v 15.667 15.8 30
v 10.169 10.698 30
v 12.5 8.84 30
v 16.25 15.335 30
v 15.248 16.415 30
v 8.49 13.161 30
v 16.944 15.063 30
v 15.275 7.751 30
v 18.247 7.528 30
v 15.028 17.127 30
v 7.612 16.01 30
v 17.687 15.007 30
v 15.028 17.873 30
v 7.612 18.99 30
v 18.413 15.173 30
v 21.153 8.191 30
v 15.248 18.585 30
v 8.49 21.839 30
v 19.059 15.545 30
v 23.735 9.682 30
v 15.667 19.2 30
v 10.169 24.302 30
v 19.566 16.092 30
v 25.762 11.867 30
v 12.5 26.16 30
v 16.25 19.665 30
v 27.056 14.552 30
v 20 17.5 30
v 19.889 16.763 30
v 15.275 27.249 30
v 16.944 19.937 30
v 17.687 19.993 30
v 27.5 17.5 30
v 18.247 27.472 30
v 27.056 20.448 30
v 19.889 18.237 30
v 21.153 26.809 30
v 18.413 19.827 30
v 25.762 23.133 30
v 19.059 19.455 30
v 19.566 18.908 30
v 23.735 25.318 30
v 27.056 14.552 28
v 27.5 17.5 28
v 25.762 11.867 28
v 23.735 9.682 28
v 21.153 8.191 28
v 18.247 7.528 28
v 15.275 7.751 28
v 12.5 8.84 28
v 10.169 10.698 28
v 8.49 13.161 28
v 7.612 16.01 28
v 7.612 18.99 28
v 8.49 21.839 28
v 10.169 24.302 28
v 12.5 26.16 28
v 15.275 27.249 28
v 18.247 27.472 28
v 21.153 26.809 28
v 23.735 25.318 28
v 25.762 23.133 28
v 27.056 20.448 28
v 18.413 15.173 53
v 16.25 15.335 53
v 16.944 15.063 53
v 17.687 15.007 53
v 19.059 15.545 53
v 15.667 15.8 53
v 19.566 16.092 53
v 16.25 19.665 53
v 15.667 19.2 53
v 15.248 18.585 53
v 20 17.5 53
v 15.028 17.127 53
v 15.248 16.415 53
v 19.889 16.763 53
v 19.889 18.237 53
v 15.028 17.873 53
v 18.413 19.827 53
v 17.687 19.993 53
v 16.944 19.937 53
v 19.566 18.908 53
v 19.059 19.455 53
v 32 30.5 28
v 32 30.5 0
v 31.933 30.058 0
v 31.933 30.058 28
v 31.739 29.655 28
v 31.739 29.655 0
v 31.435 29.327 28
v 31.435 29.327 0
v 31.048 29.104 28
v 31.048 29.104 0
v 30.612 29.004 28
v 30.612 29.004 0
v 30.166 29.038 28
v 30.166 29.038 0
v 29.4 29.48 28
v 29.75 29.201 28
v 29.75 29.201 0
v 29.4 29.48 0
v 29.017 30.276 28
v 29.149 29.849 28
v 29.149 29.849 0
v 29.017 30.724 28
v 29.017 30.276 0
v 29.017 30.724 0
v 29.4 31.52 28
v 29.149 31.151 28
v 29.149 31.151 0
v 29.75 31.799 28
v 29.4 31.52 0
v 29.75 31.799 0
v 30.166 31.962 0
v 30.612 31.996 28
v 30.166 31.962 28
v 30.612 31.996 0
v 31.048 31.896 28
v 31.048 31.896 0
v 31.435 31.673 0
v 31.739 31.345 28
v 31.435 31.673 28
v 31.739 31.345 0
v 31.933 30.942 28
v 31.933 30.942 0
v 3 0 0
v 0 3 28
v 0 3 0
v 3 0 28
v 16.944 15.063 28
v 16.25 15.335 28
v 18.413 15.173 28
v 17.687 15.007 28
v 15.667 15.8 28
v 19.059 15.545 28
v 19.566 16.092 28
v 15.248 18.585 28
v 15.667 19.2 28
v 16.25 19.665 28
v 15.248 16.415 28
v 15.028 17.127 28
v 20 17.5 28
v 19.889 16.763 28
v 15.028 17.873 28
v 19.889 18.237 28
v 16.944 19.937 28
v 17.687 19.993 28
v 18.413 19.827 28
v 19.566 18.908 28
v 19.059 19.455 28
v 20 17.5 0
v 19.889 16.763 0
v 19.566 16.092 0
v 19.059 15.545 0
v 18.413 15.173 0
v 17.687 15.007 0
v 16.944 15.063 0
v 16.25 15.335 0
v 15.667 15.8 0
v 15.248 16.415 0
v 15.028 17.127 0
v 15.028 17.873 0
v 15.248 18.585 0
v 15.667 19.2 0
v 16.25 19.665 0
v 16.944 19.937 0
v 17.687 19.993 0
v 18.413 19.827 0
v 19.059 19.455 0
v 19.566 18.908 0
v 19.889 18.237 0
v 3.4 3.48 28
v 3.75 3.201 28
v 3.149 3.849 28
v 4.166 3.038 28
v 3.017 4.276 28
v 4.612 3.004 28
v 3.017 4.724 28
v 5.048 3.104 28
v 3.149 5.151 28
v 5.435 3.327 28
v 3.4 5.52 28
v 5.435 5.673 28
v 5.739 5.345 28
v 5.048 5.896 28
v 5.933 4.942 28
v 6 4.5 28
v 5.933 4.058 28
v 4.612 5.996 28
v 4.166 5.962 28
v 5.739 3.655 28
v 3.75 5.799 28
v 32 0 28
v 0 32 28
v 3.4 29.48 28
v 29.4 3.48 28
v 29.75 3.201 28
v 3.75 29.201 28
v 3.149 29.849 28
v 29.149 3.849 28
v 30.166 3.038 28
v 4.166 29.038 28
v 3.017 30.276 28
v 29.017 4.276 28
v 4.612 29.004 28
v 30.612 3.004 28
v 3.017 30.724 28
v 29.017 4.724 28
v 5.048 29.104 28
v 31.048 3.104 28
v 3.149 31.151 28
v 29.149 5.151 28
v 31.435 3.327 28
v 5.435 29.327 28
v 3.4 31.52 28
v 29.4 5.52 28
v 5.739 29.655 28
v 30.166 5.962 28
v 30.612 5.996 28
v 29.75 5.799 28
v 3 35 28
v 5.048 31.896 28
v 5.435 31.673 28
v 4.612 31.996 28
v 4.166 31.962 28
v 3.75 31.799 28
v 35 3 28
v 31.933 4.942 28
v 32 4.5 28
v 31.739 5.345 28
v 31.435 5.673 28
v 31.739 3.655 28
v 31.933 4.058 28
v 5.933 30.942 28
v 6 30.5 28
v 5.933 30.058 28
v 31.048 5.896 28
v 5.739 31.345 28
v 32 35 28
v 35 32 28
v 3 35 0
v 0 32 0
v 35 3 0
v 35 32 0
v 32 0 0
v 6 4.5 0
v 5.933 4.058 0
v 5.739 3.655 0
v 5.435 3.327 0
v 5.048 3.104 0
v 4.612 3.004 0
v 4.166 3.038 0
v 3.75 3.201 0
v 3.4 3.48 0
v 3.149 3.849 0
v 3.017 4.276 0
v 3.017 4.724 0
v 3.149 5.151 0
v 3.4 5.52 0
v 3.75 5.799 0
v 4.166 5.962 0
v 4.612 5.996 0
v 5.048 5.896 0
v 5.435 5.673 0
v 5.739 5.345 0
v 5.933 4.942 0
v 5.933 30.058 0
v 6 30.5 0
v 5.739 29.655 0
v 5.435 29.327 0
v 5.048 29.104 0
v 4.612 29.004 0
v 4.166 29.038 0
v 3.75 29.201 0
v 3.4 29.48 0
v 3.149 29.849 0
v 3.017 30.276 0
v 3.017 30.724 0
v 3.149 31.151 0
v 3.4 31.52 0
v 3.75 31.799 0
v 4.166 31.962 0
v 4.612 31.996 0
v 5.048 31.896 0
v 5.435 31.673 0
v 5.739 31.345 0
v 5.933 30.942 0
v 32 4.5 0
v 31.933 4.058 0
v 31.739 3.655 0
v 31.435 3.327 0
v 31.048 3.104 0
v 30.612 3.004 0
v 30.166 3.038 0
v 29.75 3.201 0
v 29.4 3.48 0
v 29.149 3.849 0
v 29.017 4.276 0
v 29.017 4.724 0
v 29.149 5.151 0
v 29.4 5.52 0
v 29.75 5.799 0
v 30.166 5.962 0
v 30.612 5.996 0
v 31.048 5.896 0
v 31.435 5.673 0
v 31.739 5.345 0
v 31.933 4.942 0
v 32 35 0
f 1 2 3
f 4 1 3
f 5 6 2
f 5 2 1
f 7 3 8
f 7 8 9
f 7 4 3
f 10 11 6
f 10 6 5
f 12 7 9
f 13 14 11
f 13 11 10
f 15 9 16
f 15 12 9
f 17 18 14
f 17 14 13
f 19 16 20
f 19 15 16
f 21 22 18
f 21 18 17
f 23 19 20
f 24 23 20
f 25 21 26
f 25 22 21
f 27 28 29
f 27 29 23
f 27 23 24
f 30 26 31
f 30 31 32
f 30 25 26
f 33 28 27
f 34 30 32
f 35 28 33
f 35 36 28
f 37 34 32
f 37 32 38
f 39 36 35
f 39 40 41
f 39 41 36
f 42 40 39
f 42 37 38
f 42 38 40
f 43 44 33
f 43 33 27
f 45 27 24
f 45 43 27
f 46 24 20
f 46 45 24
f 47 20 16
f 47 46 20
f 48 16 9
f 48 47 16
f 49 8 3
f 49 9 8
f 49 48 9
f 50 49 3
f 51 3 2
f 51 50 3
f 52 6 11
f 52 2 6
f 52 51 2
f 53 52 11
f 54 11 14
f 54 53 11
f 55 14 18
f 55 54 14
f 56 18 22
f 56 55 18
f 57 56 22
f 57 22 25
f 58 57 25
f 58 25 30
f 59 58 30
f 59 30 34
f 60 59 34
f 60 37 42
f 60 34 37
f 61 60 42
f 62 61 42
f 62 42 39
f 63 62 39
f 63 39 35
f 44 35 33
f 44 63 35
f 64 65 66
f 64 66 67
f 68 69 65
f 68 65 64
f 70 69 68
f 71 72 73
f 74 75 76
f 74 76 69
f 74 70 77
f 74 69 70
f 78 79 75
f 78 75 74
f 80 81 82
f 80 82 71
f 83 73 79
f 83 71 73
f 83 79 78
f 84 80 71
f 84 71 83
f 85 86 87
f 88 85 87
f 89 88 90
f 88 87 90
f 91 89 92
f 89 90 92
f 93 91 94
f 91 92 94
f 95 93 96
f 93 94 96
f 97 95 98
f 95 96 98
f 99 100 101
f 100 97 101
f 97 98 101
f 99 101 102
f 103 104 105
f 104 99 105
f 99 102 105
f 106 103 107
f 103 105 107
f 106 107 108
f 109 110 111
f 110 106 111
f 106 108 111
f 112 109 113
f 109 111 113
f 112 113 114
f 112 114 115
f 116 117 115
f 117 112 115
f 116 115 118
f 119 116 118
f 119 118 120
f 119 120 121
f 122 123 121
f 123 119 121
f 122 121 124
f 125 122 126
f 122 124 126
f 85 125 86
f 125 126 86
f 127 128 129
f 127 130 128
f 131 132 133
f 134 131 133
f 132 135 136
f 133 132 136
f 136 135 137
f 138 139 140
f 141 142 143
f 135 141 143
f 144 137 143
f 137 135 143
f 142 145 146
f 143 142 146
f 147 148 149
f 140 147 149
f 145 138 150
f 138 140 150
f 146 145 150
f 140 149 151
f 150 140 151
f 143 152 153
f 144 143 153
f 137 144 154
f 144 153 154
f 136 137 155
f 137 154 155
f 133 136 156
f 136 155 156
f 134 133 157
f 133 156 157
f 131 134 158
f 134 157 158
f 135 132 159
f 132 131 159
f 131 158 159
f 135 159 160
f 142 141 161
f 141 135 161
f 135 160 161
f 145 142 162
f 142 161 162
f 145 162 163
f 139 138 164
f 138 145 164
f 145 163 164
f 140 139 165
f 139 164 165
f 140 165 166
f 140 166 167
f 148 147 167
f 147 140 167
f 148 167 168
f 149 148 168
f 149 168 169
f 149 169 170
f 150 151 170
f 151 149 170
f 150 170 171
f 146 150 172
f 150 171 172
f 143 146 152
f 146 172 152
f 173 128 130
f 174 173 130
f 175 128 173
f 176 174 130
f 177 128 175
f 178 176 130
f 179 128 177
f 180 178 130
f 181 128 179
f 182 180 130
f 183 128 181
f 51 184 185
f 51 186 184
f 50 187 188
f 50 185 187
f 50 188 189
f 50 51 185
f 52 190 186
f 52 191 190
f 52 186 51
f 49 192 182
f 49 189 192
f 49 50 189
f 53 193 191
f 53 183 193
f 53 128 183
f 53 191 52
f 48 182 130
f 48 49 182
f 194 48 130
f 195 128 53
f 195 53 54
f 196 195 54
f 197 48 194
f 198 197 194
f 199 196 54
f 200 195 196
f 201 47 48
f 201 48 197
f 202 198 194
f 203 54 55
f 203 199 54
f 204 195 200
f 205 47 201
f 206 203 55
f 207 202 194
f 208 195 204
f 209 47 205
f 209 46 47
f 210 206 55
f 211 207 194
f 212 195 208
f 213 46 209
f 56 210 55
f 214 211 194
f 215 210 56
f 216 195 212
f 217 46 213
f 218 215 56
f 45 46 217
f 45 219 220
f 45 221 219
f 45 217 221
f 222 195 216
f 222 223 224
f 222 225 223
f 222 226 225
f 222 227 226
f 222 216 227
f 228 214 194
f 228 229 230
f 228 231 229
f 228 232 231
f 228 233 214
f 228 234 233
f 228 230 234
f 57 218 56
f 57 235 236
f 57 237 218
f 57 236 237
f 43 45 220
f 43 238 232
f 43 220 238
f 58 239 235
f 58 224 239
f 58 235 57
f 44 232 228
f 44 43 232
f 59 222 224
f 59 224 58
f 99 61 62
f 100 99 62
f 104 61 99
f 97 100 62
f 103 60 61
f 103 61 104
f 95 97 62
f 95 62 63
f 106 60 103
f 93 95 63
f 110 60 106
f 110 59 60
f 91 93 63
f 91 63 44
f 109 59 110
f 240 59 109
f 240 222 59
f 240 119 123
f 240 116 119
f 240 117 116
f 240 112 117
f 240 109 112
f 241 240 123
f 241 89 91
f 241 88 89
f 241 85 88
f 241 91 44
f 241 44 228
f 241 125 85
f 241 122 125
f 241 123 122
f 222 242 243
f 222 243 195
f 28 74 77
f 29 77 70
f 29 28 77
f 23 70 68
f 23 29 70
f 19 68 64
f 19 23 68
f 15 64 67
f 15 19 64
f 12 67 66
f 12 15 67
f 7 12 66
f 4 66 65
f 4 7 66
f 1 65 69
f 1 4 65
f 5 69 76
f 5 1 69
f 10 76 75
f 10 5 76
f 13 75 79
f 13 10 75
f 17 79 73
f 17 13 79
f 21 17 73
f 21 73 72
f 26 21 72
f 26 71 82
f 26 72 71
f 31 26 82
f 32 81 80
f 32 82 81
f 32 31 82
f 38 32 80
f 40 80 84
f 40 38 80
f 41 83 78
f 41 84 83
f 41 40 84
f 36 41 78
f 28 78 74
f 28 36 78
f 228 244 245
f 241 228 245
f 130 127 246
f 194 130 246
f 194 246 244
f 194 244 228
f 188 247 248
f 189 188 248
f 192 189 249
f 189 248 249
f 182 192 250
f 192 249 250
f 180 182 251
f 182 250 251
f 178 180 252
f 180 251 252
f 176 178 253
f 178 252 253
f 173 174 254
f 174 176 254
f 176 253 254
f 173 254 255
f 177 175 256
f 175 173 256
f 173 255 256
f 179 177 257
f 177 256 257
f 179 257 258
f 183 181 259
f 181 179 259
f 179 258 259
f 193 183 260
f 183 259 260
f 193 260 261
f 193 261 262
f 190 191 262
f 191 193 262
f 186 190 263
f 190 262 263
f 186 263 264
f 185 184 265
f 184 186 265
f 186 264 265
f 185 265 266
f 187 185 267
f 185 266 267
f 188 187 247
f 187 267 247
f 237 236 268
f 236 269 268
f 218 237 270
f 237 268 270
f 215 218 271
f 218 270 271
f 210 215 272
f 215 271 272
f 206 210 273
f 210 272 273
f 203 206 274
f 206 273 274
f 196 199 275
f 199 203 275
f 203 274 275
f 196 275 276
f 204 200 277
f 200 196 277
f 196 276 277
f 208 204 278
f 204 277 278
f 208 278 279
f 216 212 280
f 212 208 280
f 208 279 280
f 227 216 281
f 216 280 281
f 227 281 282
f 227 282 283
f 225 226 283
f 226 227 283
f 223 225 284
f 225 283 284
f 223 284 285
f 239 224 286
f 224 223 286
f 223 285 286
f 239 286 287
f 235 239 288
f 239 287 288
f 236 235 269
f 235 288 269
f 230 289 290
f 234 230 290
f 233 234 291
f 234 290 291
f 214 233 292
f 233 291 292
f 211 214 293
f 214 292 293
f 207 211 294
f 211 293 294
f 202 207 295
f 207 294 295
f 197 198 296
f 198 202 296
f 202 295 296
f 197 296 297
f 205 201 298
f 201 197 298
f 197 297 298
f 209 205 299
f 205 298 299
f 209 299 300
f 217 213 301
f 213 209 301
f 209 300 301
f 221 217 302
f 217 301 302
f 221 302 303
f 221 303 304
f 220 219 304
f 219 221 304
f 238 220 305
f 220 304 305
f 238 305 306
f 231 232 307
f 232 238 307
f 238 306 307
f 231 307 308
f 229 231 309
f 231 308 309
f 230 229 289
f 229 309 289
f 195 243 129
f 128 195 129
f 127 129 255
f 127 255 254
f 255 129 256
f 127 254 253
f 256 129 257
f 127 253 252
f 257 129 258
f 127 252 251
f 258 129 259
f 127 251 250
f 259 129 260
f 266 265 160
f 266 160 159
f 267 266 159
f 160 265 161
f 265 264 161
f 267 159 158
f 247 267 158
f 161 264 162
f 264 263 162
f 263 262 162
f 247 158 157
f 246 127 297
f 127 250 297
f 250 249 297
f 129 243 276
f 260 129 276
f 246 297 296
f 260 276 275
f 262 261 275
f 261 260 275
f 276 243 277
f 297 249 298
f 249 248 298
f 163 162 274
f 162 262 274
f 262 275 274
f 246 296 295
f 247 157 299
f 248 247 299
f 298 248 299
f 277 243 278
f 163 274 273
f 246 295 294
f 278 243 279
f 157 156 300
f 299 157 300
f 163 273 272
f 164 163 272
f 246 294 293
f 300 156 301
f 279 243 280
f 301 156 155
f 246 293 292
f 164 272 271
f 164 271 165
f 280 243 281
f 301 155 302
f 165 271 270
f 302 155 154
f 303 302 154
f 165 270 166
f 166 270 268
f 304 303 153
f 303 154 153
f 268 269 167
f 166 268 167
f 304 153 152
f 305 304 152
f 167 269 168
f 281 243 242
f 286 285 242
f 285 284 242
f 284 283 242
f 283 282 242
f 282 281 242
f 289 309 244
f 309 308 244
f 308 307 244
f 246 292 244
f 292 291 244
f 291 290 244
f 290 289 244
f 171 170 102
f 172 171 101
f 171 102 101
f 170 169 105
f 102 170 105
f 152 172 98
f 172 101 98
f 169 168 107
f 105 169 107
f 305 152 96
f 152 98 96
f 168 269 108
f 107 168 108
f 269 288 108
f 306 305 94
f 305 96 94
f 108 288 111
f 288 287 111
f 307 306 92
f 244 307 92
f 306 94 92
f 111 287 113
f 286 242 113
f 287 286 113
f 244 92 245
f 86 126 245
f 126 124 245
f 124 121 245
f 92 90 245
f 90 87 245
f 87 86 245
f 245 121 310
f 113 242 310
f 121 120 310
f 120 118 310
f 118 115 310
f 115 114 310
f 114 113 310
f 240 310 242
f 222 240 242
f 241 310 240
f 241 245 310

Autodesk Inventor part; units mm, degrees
ref_plane "YZ Plane" through (0, 0, 0) normal (1, 0, 0) x (0, 1, 0)
ref_plane "XZ Plane" through (0, 0, 0) normal (0, 1, 0) x (-1, 0, 0)
ref_plane "XY Plane" through (0, 0, 0) normal (0, 0, 1) x (1, 0, 0)
sketch "Sketch1" plane through (0, 0, 0) normal (0, 0, 1) x (1, 0, 0)
  line L0 (0, 0) -> (35, 0)
  line L1 (35, 0) -> (35, 35)
  line L2 (35, 35) -> (0, 35)
  line L3 (0, 35) -> (0, 0)
  line L4 (4.5, 30.5) -> (30.5, 30.5) construction
  line L5 (30.5, 30.5) -> (30.5, 4.5) construction
  line L6 (30.5, 4.5) -> (4.5, 4.5) construction
  line L7 (4.5, 4.5) -> (4.5, 30.5) construction
  circle A0 centre (4.5, 30.5) radius 1.5
  circle A1 centre (30.5, 30.5) radius 1.5
  circle A2 centre (30.5, 4.5) radius 1.5
  circle A3 centre (4.5, 4.5) radius 1.5
  circle A4 centre (17.5, 17.5) radius 2.5
  point P0 (17.5, 35)
  point P1 (35, 17.5)
  dimension "d0" = 35
  dimension "d1" = 35
  dimension "d2" = 26
  dimension "d3" = 3
  dimension "d4" = 3
  dimension "d5" = 3
  dimension "d6" = 3
  dimension "d9" = 5
extrude "Extrusion1" add sketch "Sketch1" along normal blind 28
chamfer "Chamfer1" distance 3 angle 45 4 edges at (35, 35, 14) (35, 0, 14) (0, 0, 14) (0, 35, 14)
sketch "Sketch2" plane through (0, 0, 28) normal (0, 0, 1) x (1, 0, 0)
  circle A0 centre (17.5, 17.5) radius 2.5 construction
  circle A1 centre (17.5, 17.5) radius 10
  point P0 (0, 0)
  dimension "d13" = 20
sketch "Sketch3" plane through (0, 0, 28) normal (0, 0, 1) x (1, 0, 0)
  circle A0 centre (17.5, 17.5) radius 2.5 projected
  point P0 (0, 0)
extrude "Extrusion2" add sketch "Sketch3" along normal blind 25
extrude "Extrusion3" add sketch "Sketch2" along normal blind 2
properties part number "NEMA17"
